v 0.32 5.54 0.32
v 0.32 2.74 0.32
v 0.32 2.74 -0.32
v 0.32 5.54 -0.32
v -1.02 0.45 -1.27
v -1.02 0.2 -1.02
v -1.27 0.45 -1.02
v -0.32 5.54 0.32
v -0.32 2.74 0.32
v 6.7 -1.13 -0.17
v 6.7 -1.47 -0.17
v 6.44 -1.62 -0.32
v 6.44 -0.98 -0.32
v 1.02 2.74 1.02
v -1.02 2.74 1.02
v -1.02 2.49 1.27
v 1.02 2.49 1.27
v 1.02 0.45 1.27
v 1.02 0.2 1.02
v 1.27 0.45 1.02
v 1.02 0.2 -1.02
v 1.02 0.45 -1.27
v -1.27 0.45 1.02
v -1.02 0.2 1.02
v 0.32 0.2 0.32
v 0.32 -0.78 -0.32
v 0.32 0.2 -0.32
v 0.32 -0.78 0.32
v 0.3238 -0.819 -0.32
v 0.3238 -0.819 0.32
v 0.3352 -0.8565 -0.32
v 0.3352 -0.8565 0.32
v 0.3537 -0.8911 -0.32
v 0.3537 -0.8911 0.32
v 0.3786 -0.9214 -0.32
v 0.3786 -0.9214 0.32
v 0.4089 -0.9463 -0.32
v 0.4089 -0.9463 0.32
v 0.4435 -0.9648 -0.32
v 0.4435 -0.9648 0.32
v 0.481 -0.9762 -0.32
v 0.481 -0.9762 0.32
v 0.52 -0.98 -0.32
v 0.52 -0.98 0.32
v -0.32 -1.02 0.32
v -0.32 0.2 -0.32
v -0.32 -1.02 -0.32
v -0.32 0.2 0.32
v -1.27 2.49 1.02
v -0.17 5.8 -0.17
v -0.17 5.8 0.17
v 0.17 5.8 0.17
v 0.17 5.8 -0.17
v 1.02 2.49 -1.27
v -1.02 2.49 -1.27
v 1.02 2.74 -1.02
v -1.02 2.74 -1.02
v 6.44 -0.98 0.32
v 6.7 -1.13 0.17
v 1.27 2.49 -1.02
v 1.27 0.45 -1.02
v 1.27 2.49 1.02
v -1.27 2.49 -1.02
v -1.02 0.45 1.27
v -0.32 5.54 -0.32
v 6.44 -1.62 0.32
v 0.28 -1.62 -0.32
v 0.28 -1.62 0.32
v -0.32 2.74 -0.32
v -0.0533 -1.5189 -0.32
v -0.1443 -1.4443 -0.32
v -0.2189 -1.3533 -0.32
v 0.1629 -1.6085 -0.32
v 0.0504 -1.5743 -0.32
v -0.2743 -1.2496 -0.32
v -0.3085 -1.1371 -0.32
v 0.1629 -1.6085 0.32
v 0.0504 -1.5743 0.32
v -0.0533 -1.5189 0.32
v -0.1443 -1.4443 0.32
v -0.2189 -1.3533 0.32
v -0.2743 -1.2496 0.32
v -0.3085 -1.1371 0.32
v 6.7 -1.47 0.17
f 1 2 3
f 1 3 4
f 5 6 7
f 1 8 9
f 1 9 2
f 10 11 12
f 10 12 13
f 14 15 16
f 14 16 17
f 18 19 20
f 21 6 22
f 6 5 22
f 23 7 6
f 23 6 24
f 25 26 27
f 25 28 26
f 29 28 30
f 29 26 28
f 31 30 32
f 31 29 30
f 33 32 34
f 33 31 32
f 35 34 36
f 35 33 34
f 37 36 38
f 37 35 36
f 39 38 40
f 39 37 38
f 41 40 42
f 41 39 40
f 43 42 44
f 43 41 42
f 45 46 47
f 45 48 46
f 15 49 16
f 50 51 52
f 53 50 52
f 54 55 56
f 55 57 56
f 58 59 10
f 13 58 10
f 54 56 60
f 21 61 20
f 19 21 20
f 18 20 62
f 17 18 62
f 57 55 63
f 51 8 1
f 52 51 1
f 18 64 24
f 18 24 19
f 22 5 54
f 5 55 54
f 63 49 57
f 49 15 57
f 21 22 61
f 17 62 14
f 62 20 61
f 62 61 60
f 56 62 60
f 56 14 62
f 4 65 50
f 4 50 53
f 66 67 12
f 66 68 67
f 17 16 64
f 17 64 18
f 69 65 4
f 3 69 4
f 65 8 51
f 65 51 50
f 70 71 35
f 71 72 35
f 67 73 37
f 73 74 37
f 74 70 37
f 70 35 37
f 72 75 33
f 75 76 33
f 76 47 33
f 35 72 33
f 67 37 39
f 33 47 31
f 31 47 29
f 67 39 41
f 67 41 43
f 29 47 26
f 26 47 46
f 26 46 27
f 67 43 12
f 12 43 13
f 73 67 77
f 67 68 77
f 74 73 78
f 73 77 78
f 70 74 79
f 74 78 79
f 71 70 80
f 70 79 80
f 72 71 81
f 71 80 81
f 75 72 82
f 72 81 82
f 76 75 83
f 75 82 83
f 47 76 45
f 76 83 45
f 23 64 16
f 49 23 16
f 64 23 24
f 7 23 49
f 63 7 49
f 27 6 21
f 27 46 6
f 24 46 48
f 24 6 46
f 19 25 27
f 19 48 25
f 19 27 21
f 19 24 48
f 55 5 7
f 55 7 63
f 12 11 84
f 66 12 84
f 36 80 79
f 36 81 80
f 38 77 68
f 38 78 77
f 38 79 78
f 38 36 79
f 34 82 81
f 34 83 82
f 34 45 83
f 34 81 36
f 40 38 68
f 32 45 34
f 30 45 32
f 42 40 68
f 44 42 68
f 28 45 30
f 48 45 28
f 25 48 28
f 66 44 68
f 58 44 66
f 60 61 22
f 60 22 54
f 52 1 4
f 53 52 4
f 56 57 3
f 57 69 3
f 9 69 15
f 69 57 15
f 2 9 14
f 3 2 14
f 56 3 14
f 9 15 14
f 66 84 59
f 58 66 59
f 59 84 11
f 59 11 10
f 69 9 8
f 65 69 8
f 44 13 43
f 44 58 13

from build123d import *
from OCP.BRepFilletAPI import BRepFilletAPI_MakeChamfer

# Parameters (mm, degrees)
ESBO_O1_W                = 0.64
ESBO_O1_H                = 5.6
RESSALTO_EXTRUS_O1_DEPTH = 0.32
ESBO_O2_W                = 2.54
ESBO_O2_H                = 2.54
RESSALTO_EXTRUS_O2_DEPTH = 1.27
RESSALTO_EXTRUS_O3_DEPTH = 0.32
FILETE1_R                = 0.2
FILETE2_R                = 0.6
CHANFRO1_SIZE            = 0.15
CHANFRO1_SIZE2           = 0.26
CHANFRO2_SIZE            = 0.26
CHANFRO2_SIZE2           = 0.15
CHANFRO3_SIZE            = 0.25


with BuildPart() as part:
    # Esboço1 → Ressalto-extrusão1 (new, symmetric)
    with BuildSketch(Plane.XY):
        with Locations((0, 3)):
            Rectangle(ESBO_O1_W, ESBO_O1_H)
    extrude(amount=RESSALTO_EXTRUS_O1_DEPTH, both=True)

    # Esboço2 → Ressalto-extrusão2 (add, symmetric)
    with BuildSketch(Plane.XY):
        with Locations((0, 1.47)):
            Rectangle(ESBO_O2_W, ESBO_O2_H)
    extrude(amount=RESSALTO_EXTRUS_O2_DEPTH, both=True)

    # Esboço3 → Ressalto-extrusão3 (add, symmetric)
    with BuildSketch(Plane.XY):
        Polygon((0.32, 0.2), (-0.32, 0.2), (-0.32, -1.62), (6.7, -1.62), (6.7, -0.98), (0.32, -0.98), align=None)
    extrude(amount=RESSALTO_EXTRUS_O3_DEPTH, both=True)

    # Filete1
    filete1_edges = [part.edges().sort_by_distance(p)[0] for p in [
        (0.32, -0.98, 0),
    ]]
    fillet(filete1_edges, radius=FILETE1_R)

    # Filete2
    filete2_edges = [part.edges().sort_by_distance(p)[0] for p in [
        (-0.32, -1.62, 0),
    ]]
    fillet(filete2_edges, radius=FILETE2_R)

    # Chanfro1
    chanfro1_edges = [part.edges().sort_by_distance(p)[0] for p in [
        (0, 5.8, 0.32),
        (0, 5.8, -0.32),
        (-0.32, 5.8, 0),
        (0.32, 5.8, 0),
    ]]
    chanfro1_side = [part.faces().sort_by_distance(p)[0] for p in [
        (0, 5.8, 0),
    ]]
    chamfer(chanfro1_edges, length=CHANFRO1_SIZE, length2=CHANFRO1_SIZE2, reference=chanfro1_side[0])

    # Chanfro2: one chamfer whose edges measure the first distance from different faces: ONE call of the kernel's chamfer builder (chamfer() names one face for all edges)
    chanfro2_edges_1 = [part.edges().sort_by_distance(p)[0] for p in [
        (6.7, -1.3, 0.32),
    ]]
    chanfro2_side_1 = [part.faces().sort_by_distance(p)[0] for p in [
        (2.770539373, -1.16393397, 0.32),
    ]]
    chanfro2_edges_2 = [part.edges().sort_by_distance(p)[0] for p in [
        (6.7, -1.62, 0),
    ]]
    chanfro2_side_2 = [part.faces().sort_by_distance(p)[0] for p in [
        (3.49, -1.62, 0),
    ]]
    chanfro2_edges_3 = [part.edges().sort_by_distance(p)[0] for p in [
        (6.7, -0.98, 0),
    ]]
    chanfro2_side_3 = [part.faces().sort_by_distance(p)[0] for p in [
        (3.61, -0.98, 0),
    ]]
    chanfro2_edges_4 = [part.edges().sort_by_distance(p)[0] for p in [
        (6.7, -1.3, -0.32),
    ]]
    chanfro2_side_4 = [part.faces().sort_by_distance(p)[0] for p in [
        (2.770539373, -1.16393397, -0.32),
    ]]
    chanfro2 = BRepFilletAPI_MakeChamfer(part.part.solid().wrapped)
    for e in chanfro2_edges_1:
        chanfro2.Add(CHANFRO2_SIZE, CHANFRO2_SIZE2, e.wrapped, chanfro2_side_1[0].wrapped)  # the first distance lies on this face
    for e in chanfro2_edges_2:
        chanfro2.Add(CHANFRO2_SIZE, CHANFRO2_SIZE2, e.wrapped, chanfro2_side_2[0].wrapped)  # the first distance lies on this face
    for e in chanfro2_edges_3:
        chanfro2.Add(CHANFRO2_SIZE, CHANFRO2_SIZE2, e.wrapped, chanfro2_side_3[0].wrapped)  # the first distance lies on this face
    for e in chanfro2_edges_4:
        chanfro2.Add(CHANFRO2_SIZE, CHANFRO2_SIZE2, e.wrapped, chanfro2_side_4[0].wrapped)  # the first distance lies on this face
    add(Compound.cast(chanfro2.Shape()), mode=Mode.REPLACE)

    # Chanfro3
    chanfro3_edges = [part.edges().sort_by_distance(p)[0] for p in [
        (0, 0.2, -1.27),
        (-1.27, 0.2, 0),
        (0, 2.74, -1.27),
        (1.27, 2.74, 0),
        (-1.27, 1.47, -1.27),
        (-1.27, 2.74, 0),
        (1.27, 1.47, -1.27),
        (1.27, 0.2, 0),
        (-1.27, 1.47, 1.27),
        (0, 0.2, 1.27),
        (1.27, 1.47, 1.27),
        (0, 2.74, 1.27),
    ]]
    chamfer(chanfro3_edges, length=CHANFRO3_SIZE)


solid = part.part
